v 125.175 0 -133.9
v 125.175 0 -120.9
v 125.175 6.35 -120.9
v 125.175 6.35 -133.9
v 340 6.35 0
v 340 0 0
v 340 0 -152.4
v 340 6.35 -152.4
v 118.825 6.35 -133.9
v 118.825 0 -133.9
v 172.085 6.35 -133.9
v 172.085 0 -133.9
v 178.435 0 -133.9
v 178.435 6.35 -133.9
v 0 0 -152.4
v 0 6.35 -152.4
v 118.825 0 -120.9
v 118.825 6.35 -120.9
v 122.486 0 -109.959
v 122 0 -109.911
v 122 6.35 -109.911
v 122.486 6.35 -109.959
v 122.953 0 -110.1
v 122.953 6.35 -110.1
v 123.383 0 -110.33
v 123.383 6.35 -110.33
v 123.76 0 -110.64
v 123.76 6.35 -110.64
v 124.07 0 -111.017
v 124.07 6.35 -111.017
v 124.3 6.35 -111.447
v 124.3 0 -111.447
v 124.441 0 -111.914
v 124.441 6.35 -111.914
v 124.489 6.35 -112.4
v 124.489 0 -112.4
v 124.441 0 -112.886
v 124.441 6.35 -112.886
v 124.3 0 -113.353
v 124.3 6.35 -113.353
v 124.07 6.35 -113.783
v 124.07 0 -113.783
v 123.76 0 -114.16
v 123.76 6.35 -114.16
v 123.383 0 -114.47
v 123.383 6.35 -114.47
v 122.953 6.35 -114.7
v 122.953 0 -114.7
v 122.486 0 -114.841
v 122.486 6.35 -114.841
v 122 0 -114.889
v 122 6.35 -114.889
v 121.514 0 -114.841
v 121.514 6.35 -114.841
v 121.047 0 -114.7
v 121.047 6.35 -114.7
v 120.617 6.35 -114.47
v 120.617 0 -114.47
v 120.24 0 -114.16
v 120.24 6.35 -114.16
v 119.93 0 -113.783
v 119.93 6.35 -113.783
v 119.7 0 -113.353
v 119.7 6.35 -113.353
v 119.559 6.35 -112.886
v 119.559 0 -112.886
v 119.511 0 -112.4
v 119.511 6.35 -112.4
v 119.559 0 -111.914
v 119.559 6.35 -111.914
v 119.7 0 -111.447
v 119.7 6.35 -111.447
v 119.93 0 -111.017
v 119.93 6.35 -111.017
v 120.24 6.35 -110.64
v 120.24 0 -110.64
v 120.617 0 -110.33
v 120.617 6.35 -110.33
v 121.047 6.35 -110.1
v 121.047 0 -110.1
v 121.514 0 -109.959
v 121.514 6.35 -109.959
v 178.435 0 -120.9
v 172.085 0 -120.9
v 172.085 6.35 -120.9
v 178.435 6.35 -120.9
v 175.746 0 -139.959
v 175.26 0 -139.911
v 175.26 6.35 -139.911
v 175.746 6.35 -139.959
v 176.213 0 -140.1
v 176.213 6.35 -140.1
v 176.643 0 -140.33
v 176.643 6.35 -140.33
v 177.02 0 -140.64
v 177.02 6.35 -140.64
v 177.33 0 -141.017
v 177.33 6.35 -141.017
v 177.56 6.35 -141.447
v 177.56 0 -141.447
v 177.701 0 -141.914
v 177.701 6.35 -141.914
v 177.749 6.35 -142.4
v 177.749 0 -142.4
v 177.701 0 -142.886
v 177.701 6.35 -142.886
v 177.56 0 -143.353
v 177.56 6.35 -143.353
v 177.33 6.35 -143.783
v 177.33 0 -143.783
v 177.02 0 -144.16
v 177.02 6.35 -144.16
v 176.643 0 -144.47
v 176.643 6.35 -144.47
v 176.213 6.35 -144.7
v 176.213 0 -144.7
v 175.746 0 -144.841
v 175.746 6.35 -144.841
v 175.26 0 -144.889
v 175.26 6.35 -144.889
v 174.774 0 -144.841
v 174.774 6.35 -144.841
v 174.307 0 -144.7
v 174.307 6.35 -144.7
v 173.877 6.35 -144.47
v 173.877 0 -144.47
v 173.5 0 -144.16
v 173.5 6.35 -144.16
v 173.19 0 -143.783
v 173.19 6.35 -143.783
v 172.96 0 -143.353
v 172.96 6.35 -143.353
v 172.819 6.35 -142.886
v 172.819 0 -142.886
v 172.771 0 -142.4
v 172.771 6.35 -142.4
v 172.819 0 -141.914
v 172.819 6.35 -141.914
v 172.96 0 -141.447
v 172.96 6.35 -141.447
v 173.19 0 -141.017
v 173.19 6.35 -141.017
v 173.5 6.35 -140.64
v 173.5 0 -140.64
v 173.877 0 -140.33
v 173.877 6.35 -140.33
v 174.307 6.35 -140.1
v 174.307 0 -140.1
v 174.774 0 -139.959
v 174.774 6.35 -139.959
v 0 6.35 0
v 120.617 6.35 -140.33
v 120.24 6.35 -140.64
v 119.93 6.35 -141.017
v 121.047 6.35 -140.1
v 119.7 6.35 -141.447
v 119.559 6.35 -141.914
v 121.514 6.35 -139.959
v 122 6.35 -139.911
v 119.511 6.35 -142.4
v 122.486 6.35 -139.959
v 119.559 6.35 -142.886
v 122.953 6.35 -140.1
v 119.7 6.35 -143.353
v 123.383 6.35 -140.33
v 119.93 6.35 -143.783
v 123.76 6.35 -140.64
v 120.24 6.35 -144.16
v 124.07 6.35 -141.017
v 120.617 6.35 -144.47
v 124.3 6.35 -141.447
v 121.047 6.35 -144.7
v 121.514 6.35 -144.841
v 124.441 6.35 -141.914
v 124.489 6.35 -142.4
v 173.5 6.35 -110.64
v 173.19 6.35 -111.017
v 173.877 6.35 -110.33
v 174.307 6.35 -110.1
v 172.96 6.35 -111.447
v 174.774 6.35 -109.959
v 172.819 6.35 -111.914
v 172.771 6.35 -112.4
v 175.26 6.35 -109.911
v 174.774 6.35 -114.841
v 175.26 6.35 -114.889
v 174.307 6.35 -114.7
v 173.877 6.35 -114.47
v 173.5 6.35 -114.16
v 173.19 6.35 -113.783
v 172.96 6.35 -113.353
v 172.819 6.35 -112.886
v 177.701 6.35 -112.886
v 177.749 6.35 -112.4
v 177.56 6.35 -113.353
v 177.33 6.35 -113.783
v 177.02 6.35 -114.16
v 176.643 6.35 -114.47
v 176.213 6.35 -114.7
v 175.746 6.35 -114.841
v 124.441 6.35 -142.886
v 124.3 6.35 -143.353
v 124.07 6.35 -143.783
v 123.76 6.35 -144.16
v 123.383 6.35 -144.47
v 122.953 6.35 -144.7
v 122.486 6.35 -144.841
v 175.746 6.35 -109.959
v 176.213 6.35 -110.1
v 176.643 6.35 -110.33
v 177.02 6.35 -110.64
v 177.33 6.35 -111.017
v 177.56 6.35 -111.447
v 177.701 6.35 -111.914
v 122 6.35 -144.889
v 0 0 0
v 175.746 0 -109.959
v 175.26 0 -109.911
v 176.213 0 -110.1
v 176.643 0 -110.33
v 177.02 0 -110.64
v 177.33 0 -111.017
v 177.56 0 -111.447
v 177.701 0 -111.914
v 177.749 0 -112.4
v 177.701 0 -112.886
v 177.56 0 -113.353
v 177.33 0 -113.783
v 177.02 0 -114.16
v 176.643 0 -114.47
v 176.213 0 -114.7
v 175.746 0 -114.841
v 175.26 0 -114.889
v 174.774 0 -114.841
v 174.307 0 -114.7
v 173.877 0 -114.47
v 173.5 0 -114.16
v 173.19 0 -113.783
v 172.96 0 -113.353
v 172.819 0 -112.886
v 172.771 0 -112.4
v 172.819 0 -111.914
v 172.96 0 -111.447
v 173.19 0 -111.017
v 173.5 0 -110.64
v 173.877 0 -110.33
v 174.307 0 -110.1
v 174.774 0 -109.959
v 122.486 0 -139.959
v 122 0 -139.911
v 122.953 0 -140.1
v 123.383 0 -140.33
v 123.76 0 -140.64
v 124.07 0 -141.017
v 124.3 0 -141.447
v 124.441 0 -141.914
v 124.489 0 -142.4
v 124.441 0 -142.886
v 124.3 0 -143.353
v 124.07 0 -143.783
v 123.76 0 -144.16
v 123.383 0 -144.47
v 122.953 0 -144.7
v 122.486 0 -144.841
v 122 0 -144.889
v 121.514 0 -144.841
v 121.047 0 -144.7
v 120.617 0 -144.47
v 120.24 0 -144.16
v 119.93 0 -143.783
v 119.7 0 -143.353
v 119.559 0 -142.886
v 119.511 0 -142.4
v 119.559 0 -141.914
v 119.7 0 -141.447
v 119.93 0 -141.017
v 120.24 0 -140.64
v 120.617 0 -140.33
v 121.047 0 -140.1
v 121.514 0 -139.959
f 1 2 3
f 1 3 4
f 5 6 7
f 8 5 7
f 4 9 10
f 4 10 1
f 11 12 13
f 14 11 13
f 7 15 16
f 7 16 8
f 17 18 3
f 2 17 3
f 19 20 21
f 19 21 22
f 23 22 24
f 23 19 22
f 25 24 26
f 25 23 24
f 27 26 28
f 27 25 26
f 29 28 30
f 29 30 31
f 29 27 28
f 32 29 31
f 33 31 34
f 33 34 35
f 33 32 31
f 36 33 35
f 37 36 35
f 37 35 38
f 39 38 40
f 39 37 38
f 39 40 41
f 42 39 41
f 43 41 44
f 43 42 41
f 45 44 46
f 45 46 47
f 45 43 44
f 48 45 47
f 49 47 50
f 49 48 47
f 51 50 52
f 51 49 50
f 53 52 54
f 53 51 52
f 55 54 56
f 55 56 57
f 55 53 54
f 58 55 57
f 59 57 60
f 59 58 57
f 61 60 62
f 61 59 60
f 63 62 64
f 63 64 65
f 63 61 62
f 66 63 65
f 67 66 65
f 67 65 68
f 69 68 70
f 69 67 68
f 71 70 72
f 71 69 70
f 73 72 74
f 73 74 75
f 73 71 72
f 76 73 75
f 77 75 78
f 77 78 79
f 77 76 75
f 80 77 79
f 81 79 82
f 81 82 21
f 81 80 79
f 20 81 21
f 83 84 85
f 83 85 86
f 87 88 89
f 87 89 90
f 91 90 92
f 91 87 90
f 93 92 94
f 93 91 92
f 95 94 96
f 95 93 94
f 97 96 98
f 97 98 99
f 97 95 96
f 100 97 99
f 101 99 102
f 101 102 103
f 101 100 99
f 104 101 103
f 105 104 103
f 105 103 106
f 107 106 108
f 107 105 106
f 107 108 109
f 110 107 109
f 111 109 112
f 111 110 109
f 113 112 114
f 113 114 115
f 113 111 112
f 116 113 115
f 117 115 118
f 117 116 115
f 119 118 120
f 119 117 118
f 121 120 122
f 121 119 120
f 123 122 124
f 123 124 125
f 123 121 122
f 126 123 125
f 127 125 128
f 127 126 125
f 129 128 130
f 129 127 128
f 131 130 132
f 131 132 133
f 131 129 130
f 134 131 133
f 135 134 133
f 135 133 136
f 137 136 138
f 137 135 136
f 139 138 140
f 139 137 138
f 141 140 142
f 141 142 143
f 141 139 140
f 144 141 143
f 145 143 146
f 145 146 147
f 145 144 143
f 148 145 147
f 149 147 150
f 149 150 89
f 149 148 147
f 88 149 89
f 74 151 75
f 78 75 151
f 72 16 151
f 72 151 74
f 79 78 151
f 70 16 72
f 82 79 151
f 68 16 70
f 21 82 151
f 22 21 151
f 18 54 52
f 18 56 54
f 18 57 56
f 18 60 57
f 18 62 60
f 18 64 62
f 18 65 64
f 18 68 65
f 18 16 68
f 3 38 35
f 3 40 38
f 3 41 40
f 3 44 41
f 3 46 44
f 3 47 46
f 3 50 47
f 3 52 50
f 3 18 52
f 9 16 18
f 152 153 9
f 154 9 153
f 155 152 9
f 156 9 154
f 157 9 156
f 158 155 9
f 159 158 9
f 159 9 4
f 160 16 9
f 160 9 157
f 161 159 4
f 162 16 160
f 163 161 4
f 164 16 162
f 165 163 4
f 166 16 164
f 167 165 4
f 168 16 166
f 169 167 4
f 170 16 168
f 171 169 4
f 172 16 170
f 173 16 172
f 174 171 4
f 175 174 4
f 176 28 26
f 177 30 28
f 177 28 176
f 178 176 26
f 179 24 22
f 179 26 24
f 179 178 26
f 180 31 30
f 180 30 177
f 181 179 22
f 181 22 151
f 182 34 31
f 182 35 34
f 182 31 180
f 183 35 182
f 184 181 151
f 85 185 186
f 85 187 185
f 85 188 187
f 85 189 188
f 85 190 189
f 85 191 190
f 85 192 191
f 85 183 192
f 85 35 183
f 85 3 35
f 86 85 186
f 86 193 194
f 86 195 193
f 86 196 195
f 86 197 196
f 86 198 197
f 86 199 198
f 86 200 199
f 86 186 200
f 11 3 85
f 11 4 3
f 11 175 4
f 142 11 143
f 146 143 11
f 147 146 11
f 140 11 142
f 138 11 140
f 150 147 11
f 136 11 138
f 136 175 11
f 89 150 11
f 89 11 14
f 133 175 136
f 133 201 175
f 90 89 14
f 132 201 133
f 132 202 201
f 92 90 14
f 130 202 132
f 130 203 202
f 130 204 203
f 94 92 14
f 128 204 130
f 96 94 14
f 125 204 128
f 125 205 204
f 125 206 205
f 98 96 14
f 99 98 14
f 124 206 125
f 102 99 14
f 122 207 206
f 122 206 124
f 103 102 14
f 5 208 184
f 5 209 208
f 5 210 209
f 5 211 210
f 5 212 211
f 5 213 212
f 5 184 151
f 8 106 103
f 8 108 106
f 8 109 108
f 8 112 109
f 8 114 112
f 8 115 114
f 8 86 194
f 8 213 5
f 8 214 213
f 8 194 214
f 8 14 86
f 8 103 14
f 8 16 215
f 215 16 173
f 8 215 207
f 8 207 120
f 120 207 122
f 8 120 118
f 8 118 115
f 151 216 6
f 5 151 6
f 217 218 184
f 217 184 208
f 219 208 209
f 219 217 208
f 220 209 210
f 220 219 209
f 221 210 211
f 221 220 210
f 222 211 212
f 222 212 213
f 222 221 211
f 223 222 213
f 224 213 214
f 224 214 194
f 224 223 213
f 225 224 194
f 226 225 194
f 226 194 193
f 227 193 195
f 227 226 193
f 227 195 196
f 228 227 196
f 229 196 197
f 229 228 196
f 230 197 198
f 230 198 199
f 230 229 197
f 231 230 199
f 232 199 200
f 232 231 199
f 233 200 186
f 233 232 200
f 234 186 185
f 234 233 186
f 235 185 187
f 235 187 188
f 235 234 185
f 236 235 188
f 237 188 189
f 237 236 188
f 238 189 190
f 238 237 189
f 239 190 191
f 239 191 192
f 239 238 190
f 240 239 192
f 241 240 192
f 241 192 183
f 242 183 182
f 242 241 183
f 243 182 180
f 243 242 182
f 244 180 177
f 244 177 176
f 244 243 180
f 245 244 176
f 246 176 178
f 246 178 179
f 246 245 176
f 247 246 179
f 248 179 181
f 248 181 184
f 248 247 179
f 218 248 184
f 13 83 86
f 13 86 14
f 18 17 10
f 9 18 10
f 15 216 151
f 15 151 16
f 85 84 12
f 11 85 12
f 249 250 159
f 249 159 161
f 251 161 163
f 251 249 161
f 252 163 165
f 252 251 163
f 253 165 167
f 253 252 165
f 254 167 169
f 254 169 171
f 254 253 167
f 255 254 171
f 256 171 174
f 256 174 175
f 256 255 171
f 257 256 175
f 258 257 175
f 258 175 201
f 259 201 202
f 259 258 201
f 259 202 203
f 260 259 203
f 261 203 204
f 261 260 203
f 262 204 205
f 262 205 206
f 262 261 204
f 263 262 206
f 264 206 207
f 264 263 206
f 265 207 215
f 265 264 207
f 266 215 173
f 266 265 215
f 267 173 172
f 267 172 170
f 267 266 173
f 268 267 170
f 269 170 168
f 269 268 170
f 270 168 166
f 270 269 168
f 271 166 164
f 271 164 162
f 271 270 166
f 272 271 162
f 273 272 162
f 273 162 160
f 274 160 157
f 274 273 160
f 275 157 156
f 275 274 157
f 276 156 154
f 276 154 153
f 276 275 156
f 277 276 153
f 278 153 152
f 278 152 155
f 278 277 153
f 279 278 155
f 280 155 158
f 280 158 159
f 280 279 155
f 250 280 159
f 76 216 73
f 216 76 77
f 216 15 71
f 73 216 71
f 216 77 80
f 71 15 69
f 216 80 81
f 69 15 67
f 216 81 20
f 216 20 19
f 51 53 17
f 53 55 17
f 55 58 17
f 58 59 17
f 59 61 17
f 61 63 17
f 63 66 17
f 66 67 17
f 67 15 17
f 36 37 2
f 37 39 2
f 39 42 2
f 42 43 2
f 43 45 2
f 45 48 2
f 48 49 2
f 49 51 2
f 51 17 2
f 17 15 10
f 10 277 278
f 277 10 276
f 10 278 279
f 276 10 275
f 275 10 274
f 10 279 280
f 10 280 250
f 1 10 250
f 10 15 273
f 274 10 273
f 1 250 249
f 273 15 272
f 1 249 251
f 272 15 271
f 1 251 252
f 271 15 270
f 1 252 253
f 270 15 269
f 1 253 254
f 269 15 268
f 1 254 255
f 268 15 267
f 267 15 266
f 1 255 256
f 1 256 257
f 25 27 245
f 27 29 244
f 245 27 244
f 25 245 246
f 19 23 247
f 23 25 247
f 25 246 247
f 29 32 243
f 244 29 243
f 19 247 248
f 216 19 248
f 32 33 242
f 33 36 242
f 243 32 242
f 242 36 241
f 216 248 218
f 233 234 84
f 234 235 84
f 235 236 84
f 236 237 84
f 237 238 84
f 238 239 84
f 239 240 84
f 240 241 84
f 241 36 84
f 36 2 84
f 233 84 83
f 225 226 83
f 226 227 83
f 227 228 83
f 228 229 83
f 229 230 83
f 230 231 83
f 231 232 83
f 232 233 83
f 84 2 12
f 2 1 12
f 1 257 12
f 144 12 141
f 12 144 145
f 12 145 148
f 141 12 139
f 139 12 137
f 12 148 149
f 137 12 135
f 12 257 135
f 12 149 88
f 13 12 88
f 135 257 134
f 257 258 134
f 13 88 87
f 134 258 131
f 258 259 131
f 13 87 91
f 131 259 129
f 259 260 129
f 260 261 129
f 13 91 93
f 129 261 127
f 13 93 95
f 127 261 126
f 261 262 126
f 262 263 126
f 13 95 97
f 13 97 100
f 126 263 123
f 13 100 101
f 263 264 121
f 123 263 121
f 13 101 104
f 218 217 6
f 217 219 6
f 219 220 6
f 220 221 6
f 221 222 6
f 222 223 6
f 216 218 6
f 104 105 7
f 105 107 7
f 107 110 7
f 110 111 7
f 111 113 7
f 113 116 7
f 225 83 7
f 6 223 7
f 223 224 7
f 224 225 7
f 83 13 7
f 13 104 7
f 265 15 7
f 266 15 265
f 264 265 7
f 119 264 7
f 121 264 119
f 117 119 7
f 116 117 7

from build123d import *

# Parameters (mm, degrees)
SKETCH1_W           = 340
SKETCH1_H           = 152.4
SKETCH1_R           = 2.4892
SKETCH1_W_2         = 6.35
SKETCH1_H_2         = 13
BOSS_EXTRUDE1_DEPTH = 6.35


with BuildPart() as part:
    # Sketch1 → Boss-Extrude1 (new body)
    with BuildSketch(Plane(origin=(0, 0, 0), x_dir=(1, 0, 0), z_dir=(0, 1, 0))):
        with Locations((170, 76.2)):
            Rectangle(SKETCH1_W, SKETCH1_H)
        with Locations(Location((122, 142.399999934, 0), (0, 0, 270))):
            Circle(SKETCH1_R, mode=Mode.SUBTRACT)
        with Locations(Location((175.260007, 142.399999934, 0), (0, 0, 270))):
            Circle(SKETCH1_R, mode=Mode.SUBTRACT)
        with Locations(Location((122, 112.39999999, 0), (0, 0, 270))):
            Circle(SKETCH1_R, mode=Mode.SUBTRACT)
        with Locations(Location((175.260007, 112.39999999, 0), (0, 0, 270))):
            Circle(SKETCH1_R, mode=Mode.SUBTRACT)
        with Locations((122, 127.399999934)):
            Rectangle(SKETCH1_W_2, SKETCH1_H_2, mode=Mode.SUBTRACT)
        with Locations((175.260007, 127.399999934)):
            Rectangle(SKETCH1_W_2, SKETCH1_H_2, mode=Mode.SUBTRACT)
    extrude(amount=BOSS_EXTRUDE1_DEPTH)


solid = part.part
